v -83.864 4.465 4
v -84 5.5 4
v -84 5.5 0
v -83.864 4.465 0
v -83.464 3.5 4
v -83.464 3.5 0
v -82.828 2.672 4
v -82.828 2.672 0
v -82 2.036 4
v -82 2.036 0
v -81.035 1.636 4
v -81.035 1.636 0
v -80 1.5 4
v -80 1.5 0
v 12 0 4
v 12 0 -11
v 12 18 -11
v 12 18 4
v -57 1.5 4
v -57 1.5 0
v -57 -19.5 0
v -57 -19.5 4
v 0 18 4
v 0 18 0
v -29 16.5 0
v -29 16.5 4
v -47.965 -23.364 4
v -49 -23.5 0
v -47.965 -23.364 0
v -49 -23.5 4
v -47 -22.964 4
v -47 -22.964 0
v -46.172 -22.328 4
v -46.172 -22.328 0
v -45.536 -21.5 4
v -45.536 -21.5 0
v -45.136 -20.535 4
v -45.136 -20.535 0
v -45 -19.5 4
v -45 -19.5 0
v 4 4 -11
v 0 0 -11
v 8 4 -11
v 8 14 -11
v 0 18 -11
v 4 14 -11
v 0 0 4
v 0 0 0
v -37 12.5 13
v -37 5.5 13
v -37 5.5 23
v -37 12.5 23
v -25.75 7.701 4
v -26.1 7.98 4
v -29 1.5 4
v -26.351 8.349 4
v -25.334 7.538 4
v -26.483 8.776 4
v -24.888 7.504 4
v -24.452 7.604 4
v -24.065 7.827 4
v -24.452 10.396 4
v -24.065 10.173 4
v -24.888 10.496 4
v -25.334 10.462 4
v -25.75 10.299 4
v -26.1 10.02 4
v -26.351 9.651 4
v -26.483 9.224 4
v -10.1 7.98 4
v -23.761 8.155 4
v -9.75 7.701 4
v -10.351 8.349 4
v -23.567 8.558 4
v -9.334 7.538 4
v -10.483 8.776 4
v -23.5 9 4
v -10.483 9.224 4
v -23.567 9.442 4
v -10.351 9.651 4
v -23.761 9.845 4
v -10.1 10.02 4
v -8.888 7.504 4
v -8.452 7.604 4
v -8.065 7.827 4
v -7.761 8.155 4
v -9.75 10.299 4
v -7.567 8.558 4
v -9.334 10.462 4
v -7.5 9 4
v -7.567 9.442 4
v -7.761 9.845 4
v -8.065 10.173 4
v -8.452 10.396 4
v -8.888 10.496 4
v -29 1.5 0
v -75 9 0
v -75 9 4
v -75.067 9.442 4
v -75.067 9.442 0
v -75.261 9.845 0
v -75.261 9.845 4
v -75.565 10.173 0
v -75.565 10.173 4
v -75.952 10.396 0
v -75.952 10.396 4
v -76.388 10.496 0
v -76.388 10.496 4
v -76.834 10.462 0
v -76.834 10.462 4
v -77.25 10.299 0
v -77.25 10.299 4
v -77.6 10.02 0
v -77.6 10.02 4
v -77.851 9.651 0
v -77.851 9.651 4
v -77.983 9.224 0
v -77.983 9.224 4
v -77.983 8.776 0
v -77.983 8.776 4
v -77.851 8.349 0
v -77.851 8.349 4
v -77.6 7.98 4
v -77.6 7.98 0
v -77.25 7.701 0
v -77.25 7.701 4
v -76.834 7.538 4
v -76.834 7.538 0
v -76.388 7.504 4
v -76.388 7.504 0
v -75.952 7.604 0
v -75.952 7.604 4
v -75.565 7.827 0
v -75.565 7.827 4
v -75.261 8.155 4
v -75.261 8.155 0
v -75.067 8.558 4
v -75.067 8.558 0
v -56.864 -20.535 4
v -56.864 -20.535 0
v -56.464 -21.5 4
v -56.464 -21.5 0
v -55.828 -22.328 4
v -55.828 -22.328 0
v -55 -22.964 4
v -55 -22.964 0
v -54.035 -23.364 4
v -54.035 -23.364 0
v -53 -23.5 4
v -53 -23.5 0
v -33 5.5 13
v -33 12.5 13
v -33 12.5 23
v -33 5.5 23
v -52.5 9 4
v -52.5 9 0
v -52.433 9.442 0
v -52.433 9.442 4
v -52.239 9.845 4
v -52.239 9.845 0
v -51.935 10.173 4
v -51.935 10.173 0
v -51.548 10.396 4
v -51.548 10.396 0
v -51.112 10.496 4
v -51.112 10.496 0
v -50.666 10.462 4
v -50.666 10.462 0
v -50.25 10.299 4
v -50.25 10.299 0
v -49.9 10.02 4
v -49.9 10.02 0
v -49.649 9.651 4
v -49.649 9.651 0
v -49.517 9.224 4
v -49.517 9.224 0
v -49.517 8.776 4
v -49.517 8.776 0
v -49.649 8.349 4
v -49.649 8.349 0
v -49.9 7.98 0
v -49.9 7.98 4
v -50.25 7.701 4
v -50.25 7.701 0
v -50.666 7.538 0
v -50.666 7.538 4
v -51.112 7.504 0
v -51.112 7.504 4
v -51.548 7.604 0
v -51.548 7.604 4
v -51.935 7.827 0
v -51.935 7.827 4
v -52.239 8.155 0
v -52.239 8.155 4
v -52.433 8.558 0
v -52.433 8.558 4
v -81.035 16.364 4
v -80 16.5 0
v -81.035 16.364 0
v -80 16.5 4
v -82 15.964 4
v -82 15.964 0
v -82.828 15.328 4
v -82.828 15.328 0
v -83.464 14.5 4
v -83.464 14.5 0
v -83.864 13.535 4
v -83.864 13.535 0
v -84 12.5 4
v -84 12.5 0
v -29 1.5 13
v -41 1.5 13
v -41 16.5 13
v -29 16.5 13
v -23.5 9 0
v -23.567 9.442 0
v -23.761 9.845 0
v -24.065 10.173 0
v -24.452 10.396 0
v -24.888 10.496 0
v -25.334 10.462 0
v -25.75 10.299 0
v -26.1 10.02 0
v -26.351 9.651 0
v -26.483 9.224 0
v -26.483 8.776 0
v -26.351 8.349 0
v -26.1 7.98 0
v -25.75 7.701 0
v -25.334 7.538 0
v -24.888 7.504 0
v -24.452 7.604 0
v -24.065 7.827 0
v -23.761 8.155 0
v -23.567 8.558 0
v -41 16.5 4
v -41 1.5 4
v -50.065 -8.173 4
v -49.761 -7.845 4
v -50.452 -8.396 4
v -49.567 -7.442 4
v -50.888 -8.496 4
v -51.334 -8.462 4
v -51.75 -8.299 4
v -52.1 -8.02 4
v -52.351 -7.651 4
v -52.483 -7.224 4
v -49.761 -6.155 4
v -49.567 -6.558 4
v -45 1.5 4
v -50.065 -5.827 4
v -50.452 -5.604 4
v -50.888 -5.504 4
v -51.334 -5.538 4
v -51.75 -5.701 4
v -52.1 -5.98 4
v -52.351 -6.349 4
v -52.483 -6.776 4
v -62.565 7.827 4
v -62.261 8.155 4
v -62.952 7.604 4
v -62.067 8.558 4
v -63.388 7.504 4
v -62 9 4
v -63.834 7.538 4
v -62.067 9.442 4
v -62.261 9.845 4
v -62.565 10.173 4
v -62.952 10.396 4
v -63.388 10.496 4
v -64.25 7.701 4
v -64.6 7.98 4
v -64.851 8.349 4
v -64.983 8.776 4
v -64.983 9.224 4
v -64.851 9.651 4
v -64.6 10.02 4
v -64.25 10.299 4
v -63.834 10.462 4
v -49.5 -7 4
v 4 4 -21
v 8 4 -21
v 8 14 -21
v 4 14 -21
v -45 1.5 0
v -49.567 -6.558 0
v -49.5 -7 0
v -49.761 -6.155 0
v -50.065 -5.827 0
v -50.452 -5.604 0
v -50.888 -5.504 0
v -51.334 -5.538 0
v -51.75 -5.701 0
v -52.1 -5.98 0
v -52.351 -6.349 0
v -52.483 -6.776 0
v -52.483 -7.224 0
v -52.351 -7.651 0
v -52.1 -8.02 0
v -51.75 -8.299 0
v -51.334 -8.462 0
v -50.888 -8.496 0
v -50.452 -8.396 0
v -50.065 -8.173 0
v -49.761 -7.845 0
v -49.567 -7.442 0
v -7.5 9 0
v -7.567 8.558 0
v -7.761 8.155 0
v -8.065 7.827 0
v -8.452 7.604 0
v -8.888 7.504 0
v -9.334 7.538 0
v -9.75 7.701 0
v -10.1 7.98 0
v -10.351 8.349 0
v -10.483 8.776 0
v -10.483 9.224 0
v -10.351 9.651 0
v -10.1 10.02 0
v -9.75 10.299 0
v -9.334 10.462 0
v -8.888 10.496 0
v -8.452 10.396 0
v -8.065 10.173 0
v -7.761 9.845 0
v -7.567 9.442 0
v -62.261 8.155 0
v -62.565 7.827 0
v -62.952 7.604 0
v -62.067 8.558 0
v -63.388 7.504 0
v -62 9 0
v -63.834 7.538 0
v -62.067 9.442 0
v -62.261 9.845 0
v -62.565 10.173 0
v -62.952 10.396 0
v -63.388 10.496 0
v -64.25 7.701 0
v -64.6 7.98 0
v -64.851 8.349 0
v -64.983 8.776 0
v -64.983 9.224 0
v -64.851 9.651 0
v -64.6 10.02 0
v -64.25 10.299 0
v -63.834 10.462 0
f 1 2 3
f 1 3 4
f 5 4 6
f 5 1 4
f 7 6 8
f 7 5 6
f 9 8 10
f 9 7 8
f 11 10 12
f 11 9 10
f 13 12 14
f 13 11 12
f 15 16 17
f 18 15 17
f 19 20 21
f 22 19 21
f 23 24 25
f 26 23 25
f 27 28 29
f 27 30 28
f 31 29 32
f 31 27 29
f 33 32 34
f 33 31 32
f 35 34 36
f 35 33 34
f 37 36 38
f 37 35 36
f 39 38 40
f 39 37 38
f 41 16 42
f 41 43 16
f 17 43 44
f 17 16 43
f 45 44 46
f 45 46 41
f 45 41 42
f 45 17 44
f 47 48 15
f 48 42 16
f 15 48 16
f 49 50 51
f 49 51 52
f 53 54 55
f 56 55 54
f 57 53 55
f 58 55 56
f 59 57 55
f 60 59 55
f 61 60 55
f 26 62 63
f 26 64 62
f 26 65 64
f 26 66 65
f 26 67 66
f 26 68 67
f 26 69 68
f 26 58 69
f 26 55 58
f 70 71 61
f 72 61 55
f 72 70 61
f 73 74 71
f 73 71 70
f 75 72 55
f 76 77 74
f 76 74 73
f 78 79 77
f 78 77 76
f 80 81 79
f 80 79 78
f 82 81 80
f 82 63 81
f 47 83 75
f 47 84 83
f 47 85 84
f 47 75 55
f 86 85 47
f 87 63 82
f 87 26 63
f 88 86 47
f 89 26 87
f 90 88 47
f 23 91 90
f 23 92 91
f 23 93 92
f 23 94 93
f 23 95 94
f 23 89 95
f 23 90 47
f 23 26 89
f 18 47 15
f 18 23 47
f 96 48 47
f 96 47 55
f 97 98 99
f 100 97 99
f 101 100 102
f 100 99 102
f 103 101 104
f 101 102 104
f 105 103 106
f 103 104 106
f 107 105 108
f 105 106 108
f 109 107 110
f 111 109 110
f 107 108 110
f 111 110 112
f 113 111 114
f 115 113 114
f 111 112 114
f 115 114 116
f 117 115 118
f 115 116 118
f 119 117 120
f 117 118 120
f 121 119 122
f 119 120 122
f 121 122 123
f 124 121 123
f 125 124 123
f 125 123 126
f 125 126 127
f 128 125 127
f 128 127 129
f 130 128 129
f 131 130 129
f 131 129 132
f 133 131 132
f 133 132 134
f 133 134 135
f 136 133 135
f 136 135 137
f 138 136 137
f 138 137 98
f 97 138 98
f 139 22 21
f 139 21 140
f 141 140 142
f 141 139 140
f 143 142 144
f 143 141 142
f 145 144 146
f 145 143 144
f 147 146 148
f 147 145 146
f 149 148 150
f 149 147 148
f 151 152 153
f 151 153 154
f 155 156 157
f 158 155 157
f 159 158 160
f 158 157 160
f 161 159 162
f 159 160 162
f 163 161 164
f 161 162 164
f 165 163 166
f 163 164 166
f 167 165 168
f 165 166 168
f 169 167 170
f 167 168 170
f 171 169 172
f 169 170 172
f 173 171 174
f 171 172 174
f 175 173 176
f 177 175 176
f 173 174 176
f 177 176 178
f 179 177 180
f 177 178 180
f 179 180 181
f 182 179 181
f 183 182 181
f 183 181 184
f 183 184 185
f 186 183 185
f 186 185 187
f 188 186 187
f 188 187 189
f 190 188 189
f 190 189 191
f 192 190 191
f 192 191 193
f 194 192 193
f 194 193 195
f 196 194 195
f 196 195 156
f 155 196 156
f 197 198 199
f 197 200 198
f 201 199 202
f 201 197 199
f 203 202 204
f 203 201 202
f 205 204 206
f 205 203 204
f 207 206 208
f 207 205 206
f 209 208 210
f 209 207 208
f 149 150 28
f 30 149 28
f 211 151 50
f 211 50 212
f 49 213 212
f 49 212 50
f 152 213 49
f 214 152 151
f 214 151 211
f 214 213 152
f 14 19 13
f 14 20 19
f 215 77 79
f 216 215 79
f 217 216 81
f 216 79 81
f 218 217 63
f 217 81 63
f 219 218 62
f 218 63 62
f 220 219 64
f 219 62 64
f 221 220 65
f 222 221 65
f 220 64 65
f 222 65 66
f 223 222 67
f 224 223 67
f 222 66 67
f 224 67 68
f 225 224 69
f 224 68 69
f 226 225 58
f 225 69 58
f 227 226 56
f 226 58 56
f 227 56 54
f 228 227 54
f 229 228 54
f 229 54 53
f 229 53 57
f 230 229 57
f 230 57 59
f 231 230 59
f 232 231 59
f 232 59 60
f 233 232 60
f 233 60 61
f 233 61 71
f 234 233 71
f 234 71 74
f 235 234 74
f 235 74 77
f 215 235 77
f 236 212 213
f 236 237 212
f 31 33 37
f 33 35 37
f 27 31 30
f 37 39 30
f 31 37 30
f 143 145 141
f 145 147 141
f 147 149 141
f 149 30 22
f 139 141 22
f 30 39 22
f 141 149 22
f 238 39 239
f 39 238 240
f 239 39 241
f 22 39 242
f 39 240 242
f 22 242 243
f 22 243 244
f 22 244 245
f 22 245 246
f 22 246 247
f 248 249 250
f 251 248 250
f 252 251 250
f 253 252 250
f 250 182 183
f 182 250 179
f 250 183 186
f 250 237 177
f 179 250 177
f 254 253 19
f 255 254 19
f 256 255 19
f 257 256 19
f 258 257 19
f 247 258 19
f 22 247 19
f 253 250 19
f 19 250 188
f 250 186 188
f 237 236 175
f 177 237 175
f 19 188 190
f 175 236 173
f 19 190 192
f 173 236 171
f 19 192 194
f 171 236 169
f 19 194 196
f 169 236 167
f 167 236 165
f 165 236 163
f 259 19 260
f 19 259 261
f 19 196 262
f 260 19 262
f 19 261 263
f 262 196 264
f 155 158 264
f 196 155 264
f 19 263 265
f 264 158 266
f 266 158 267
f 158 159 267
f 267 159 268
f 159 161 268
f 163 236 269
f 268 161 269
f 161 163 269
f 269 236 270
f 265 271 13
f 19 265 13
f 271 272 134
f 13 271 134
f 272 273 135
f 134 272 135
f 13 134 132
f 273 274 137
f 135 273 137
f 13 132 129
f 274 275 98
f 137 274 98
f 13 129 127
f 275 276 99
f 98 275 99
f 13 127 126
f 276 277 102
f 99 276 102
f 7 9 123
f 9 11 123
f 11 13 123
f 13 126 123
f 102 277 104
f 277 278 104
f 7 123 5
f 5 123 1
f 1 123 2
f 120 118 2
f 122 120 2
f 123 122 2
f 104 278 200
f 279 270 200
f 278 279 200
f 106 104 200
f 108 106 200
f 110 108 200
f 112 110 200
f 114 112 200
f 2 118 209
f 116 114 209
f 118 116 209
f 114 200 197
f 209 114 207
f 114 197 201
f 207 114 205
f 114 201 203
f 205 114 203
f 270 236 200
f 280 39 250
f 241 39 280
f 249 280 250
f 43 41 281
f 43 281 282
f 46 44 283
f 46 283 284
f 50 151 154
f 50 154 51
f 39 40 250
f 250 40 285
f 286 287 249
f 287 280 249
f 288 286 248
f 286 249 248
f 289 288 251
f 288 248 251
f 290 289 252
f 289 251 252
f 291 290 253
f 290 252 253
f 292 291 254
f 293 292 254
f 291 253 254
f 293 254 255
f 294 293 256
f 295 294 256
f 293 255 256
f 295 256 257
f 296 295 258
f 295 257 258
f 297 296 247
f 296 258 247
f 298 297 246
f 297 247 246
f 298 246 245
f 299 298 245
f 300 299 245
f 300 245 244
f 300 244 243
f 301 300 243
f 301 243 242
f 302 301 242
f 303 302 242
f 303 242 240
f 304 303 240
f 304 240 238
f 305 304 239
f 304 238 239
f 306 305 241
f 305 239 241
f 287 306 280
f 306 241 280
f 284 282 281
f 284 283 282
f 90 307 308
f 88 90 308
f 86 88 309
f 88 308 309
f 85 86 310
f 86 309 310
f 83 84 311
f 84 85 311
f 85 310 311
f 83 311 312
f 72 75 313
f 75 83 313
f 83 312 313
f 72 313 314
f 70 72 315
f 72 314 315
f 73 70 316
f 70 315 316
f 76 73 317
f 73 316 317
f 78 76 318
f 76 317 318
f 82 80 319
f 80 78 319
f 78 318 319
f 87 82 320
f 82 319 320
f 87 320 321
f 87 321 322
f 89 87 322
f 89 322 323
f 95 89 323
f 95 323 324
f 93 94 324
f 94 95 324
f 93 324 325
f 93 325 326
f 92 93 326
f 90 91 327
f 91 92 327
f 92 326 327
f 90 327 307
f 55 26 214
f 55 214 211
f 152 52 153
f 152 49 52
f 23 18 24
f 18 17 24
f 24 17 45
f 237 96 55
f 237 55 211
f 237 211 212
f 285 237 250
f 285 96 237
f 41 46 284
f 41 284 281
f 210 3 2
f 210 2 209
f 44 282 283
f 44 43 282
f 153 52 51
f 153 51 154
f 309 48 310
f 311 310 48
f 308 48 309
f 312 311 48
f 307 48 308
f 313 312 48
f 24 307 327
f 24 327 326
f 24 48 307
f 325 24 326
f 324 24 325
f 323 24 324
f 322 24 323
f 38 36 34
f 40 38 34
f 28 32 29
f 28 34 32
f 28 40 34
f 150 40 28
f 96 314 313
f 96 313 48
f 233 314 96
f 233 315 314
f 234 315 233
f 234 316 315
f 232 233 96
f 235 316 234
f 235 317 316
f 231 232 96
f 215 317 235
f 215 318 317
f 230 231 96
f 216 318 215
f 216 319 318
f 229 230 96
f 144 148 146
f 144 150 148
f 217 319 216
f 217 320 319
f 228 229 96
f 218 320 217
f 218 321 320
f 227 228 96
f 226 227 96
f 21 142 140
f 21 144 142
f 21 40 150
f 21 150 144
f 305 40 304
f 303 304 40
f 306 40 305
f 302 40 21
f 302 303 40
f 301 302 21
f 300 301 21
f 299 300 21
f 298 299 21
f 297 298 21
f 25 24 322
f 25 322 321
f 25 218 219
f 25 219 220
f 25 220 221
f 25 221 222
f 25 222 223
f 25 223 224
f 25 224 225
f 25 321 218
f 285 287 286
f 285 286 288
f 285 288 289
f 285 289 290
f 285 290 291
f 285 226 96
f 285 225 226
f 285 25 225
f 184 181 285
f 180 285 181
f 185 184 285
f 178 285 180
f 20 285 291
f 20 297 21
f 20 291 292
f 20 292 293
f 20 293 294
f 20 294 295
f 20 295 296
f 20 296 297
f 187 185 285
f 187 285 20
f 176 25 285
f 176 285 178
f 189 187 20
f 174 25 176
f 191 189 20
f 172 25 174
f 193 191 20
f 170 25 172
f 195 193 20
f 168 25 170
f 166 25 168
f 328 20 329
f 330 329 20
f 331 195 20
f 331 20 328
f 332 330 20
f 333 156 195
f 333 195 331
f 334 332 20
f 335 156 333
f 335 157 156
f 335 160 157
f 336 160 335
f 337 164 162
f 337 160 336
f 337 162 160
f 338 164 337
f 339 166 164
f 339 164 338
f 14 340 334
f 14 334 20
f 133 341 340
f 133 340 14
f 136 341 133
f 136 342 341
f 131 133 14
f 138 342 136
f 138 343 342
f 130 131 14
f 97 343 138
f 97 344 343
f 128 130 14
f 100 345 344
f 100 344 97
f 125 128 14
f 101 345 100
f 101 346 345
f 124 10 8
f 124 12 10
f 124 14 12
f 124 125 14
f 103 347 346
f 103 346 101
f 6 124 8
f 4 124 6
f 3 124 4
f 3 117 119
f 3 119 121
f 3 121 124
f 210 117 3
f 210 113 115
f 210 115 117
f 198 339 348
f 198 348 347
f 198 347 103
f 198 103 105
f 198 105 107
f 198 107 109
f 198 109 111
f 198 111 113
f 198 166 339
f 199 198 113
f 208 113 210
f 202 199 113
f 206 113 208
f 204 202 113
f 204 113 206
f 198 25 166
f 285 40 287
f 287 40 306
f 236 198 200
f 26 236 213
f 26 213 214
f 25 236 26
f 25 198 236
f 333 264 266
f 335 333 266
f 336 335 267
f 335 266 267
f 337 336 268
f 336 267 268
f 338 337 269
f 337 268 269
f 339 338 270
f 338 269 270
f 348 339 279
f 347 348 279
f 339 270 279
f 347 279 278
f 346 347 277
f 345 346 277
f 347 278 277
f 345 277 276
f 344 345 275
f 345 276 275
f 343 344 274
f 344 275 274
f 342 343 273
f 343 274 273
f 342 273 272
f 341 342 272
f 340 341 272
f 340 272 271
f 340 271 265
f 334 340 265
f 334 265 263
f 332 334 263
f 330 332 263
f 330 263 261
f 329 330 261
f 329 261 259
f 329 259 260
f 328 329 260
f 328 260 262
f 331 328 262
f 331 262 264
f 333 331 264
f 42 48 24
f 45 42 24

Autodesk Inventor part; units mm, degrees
ref_plane "YZ Plane" through (0, 0, 0) normal (1, 0, 0) x (0, 1, 0)
ref_plane "XZ Plane" through (0, 0, 0) normal (0, 1, 0) x (-1, 0, 0)
ref_plane "XY Plane" through (0, 0, 0) normal (0, 0, 1) x (1, 0, 0)
sketch "Sketch1" plane through (0, 0, 0) normal (0, 0, 1) x (1, 0, 0)
  line L0 (0, 0) -> (12, 0)
  line L1 (12, 0) -> (12, 18)
  line L2 (12, 18) -> (0, 18)
  line L3 (-29, 16.5) -> (-41, 16.5)
  line L4 (-41, 16.5) -> (-41, 1.5)
  line L5 (-41, 1.5) -> (-29, 1.5)
  line L6 (0, 18) -> (-29, 16.5)
  line L7 (0, 0) -> (-29, 1.5)
  circle A0 centre (-9, 9) radius 1.5
  dimension "d0" = 12
  dimension "d1" = 18
  dimension "d2" = 12
  dimension "d3" = 15
  dimension "d4" = 3
extrude "Extrusion1" add sketch "Sketch1" along normal blind 4
sketch "Sketch2" plane through (0, 0, 0) normal (0, 0, -1) x (-1, 0, 0)
  line L0 (0, 18) -> (29, 16.5) projected
  line L1 (0, 18) -> (-12, 18)
  line L2 (-12, 18) -> (-12, 0)
  line L3 (-12, 0) -> (0, 0)
  line L4 (0, 0) -> (0, 18)
  dimension "d11" = 12
  dimension "d7" = 12
  dimension "d8" = 18
extrude "Extrusion2" add sketch "Sketch2" along normal blind 11
sketch "Sketch3" plane through (0, 0, 4) normal (0, 0, 1) x (1, 0, 0)
  line L0 (-29, 16.5) -> (-41, 16.5) projected
  line L1 (-41, 16.5) -> (-29, 16.5)
  line L2 (-29, 16.5) -> (-29, 1.5)
  line L3 (-29, 1.5) -> (-41, 1.5)
  line L4 (-41, 1.5) -> (-41, 16.5)
  point P0 (0, 0)
  dimension "d11" = 12
  dimension "d12" = 15
extrude "Extrusion3" add sketch "Sketch3" along normal blind 9
sketch "Sketch4" plane through (0, 0, -11) normal (0, 0, -1) x (-1, 0, 0)
  line L0 (-4, 4) -> (-8, 4)
  line L1 (-8, 4) -> (-8, 14)
  line L2 (-8, 14) -> (-4, 14)
  line L3 (-4, 14) -> (-4, 4)
  point P0 (0, 0)
  dimension "d15" = 4
  dimension "d16" = 10
extrude "Extrusion4" add sketch "Sketch4" along normal blind 10
sketch "Sketch5" plane through (0, 0, 13) normal (0, 0, 1) x (1, 0, 0)
  line L0 (-33, 5.5) -> (-37, 5.5)
  line L1 (-37, 5.5) -> (-37, 12.5)
  line L2 (-37, 12.5) -> (-33, 12.5)
  line L3 (-33, 12.5) -> (-33, 5.5)
  point P0 (0, 0)
  dimension "d19" = 4
  dimension "d20" = 7
extrude "Extrusion5" add sketch "Sketch5" along normal blind 10
sketch "Sketch6" plane through (0, 0, 0) normal (0, 0, -1) x (-1, 0, 0)
  line L0 (41, 16.5) -> (41, 1.5)
  circle A0 centre (51, 9) radius 1.5
  line L1 (41, 16.5) -> (41, 1.5) projected
  line L2 (84, 1.5) -> (84, 16.5)
  line L3 (84, 16.5) -> (41, 16.5)
  line L4 (41, 16.5) -> (41, 1.5)
  line L5 (57, 1.5) -> (57, -23.5)
  line L6 (57, -23.5) -> (45, -23.5)
  line L7 (45, -23.5) -> (45, 1.5)
  line L8 (41, 1.5) -> (45, 1.5)
  line L9 (57, 1.5) -> (84, 1.5)
  point P0 (0, 0)
  dimension "d26" = 3
  dimension "d29" = 43
  dimension "d30" = 15
  dimension "d31" = 12
  dimension "d32" = 25
  dimension "d33" = 4
extrude "Extrusion7" add sketch "Sketch6" against normal blind 4
fillet "Fillet2" radius 4 4 edges at (-84, 16.5, 2) (-84, 1.5, 2) (-57, -23.5, 2) (-45, -23.5, 2)
sketch "Sketch7" plane through (0, 0, 4) normal (0, 0, 1) x (1, 0, 0)
  circle A0 centre (-63.5, 9) radius 1.5
  circle A1 centre (-76.5, 9) radius 1.5
  line L0 (-29, 16.5) -> (-41, 16.5) projected
  circle A2 centre (-51, 9) radius 1.5 projected
  point P0 (0, 0)
  dimension "d39" = 3
  dimension "d40" = 3
  dimension "d41" = 7.5
  dimension "d42" = 7.5
  dimension "d43" = 12.5
  dimension "d44" = 13
extrude "Extrusion8" cut sketch "Sketch7" against normal through all contours A0 | A1
sketch "Sketch8" plane through (0, 0, 4) normal (0, 0, 1) x (1, 0, 0)
  circle A0 centre (-51, -7) radius 1.5
  line L0 (-45, -19.5) -> (-45, 1.5) projected
  circle A1 centre (-51, 9) radius 1.5 projected
  point P0 (0, 0)
  dimension "d47" = 3
  dimension "d48" = 6
  dimension "d49" = 16
extrude "Extrusion9" cut sketch "Sketch8" against normal through all contours A0
sketch "Sketch9" plane through (0, 0, 4) normal (0, 0, 1) x (1, 0, 0)
  point P0 (0, 0)
sketch "Sketch10" plane through (0, 0, 4) normal (0, 0, 1) x (1, 0, 0)
  circle A0 centre (-25, 9) radius 1.5
  line L0 (-29, 16.5) -> (-41, 16.5) projected
  circle A1 centre (-9, 9) radius 1.5 projected
  point P0 (0, 0)
  dimension "d52" = 3
  dimension "d53" = 7.5
  dimension "d54" = 16
extrude "Extrusion10" cut sketch "Sketch10" against normal through all contours A0
properties part number "Mounting Bracket 3of4 - Copy"
